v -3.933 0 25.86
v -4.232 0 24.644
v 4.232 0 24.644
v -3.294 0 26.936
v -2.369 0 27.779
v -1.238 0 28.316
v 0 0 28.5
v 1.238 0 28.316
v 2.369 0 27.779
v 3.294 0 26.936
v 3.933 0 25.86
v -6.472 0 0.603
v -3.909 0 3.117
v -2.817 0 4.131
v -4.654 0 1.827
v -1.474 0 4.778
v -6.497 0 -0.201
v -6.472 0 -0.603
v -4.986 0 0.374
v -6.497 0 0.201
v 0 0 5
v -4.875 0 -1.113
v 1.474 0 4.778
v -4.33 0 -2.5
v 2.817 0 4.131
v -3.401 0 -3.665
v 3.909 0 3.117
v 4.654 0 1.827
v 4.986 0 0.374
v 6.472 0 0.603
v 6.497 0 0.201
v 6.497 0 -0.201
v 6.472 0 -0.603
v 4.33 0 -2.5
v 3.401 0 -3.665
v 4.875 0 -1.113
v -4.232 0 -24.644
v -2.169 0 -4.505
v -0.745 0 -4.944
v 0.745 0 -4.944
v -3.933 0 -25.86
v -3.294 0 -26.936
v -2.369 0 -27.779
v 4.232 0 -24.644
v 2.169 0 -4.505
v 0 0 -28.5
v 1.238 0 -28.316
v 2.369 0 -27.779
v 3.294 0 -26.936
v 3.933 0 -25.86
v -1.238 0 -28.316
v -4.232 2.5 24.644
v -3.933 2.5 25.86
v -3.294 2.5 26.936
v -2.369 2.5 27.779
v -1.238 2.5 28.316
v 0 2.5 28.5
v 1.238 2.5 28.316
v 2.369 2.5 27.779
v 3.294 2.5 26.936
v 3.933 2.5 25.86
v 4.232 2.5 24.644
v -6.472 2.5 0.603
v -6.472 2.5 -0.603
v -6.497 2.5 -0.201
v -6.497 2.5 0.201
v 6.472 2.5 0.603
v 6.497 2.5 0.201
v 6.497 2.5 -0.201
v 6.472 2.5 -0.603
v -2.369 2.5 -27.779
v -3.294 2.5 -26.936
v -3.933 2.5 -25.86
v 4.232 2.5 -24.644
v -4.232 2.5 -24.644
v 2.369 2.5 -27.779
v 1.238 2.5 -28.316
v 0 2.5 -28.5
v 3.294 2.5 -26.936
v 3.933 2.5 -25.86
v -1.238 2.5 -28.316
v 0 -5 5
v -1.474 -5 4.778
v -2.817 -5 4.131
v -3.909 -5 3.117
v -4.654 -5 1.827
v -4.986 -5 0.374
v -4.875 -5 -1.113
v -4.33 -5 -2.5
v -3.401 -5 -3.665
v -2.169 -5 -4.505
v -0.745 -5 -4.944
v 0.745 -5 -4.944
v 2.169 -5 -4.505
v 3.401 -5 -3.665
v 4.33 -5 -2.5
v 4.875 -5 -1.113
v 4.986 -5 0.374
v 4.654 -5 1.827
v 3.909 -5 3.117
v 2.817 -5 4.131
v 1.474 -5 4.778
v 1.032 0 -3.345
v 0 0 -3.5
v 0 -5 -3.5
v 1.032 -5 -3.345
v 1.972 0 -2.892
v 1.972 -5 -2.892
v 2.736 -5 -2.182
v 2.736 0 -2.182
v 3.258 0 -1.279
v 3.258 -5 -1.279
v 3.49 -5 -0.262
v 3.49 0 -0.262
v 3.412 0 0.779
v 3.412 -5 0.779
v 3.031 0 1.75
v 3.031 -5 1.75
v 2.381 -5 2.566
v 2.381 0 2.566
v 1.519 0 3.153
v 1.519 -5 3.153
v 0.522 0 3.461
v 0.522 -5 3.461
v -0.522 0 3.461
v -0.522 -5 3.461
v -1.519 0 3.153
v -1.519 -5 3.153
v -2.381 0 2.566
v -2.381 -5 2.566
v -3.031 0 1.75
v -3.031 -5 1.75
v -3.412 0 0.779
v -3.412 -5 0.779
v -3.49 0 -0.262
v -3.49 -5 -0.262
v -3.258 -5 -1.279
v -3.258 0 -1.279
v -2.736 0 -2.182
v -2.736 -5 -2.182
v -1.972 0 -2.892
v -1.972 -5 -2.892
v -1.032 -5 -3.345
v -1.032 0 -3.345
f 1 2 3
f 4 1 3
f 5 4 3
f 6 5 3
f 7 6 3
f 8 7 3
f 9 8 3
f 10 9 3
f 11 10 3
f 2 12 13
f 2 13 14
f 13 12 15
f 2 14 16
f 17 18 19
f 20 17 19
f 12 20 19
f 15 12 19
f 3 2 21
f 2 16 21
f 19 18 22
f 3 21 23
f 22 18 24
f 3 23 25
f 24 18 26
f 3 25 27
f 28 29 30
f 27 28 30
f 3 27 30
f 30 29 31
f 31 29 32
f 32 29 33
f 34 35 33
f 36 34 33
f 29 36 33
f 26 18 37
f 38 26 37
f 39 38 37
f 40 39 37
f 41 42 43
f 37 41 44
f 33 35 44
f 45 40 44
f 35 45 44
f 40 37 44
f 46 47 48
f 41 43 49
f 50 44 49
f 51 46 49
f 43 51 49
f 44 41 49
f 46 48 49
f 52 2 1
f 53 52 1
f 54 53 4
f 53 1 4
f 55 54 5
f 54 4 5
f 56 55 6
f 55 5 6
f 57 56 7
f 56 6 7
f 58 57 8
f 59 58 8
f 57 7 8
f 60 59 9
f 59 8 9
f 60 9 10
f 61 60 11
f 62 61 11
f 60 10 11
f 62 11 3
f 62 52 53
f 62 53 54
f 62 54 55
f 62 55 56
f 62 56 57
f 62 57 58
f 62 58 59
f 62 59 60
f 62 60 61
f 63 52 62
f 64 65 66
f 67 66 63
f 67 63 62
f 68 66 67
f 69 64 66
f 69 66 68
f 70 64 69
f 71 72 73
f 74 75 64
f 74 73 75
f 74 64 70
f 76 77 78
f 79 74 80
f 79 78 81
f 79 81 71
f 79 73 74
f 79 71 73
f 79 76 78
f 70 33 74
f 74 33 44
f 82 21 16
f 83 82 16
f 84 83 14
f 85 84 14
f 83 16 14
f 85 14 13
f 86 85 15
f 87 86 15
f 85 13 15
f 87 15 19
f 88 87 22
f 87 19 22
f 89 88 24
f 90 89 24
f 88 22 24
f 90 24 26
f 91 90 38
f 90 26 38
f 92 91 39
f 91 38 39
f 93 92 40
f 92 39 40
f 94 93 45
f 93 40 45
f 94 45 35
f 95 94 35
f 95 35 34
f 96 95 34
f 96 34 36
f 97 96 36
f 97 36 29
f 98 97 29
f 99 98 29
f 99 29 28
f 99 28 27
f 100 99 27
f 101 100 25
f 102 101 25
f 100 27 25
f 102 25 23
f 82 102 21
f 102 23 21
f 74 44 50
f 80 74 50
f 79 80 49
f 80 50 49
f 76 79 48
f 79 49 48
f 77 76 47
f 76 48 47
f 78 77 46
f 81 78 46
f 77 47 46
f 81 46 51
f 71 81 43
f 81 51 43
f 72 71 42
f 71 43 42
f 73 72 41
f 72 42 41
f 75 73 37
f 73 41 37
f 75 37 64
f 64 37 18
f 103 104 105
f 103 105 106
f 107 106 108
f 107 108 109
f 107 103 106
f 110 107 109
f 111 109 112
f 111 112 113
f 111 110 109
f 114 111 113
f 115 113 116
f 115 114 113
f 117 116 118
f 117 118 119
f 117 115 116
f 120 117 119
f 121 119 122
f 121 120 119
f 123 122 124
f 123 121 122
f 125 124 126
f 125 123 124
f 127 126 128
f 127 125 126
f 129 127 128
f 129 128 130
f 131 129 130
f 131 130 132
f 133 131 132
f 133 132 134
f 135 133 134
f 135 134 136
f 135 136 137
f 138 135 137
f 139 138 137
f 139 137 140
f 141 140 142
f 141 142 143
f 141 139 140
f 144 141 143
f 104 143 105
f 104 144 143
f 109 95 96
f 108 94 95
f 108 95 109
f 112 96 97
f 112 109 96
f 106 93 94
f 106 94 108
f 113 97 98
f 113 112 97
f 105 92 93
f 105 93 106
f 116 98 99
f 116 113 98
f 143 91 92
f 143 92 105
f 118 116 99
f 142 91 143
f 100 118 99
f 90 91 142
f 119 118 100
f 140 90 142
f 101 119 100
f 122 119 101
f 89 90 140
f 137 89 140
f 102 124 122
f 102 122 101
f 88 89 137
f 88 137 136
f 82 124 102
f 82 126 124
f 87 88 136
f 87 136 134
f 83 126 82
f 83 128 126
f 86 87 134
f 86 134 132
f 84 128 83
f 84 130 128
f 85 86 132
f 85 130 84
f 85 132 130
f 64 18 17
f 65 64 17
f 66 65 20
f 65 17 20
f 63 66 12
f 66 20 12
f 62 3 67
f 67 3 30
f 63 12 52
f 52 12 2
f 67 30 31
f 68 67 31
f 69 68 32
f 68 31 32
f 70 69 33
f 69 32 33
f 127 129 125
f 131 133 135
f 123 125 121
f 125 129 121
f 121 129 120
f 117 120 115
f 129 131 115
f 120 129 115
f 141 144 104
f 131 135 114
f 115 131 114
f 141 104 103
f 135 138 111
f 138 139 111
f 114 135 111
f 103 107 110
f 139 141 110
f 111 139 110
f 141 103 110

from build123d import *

# Parameters (mm, degrees)
SKETCH_1_R      = 4.25
SKETCH_1_R_2    = 6.5
EXTRUDE_1_DEPTH = 2.5
SKETCH_2_R      = 5
SKETCH_2_R_2    = 3.5
EXTRUDE_2_DEPTH = 5


with BuildPart() as part:
    # 스케치1 → 보스-돌출1 (new body)
    with BuildSketch(Plane(origin=(0, 0, 0), x_dir=(1, 0, 0), z_dir=(0, 1, 0))):
        with BuildLine():
            ThreePointArc((4.25, 24.25), (-0.19737792, 20.004585773), (-4.231666803, 24.644329897))
            Line((-4.231666803, 24.644329897), (-6.471960993, 0.603092784))
            ThreePointArc((-6.471960993, 0.603092784), (0, 6.5), (6.471960993, 0.603092784))
            Line((6.471960993, 0.603092784), (4.231666803, 24.644329897))
            ThreePointArc((4.231666803, 24.644329897), (4.245414227, 24.44737792), (4.25, 24.25))
        make_face()
        with Locations((0, 24.25)):
            Circle(SKETCH_1_R)
        Circle(SKETCH_1_R_2)
        with BuildLine():
            ThreePointArc((6.471960993, -0.603092784), (0, -6.5), (-6.471960993, -0.603092784))
            Line((-6.471960993, -0.603092784), (-4.231666803, -24.644329897))
            ThreePointArc((-4.231666803, -24.644329897), (-0.19737792, -20.004585773), (4.25, -24.25))
            ThreePointArc((4.25, -24.25), (4.245414227, -24.44737792), (4.231666803, -24.644329897))
            Line((4.231666803, -24.644329897), (6.471960993, -0.603092784))
        make_face()
        with Locations((0, -24.25)):
            Circle(SKETCH_1_R)
    extrude(amount=EXTRUDE_1_DEPTH)

    # 스케치2 → 보스-돌출2 (add)
    with BuildSketch(Plane.XZ):
        with Locations(Location((0, 0, 0), (0, 0, 90))):
            Circle(SKETCH_2_R)
        with Locations(Location((0, 0, 0), (0, 0, 270))):
            Circle(SKETCH_2_R_2, mode=Mode.SUBTRACT)
    extrude(amount=EXTRUDE_2_DEPTH)


solid = part.part
